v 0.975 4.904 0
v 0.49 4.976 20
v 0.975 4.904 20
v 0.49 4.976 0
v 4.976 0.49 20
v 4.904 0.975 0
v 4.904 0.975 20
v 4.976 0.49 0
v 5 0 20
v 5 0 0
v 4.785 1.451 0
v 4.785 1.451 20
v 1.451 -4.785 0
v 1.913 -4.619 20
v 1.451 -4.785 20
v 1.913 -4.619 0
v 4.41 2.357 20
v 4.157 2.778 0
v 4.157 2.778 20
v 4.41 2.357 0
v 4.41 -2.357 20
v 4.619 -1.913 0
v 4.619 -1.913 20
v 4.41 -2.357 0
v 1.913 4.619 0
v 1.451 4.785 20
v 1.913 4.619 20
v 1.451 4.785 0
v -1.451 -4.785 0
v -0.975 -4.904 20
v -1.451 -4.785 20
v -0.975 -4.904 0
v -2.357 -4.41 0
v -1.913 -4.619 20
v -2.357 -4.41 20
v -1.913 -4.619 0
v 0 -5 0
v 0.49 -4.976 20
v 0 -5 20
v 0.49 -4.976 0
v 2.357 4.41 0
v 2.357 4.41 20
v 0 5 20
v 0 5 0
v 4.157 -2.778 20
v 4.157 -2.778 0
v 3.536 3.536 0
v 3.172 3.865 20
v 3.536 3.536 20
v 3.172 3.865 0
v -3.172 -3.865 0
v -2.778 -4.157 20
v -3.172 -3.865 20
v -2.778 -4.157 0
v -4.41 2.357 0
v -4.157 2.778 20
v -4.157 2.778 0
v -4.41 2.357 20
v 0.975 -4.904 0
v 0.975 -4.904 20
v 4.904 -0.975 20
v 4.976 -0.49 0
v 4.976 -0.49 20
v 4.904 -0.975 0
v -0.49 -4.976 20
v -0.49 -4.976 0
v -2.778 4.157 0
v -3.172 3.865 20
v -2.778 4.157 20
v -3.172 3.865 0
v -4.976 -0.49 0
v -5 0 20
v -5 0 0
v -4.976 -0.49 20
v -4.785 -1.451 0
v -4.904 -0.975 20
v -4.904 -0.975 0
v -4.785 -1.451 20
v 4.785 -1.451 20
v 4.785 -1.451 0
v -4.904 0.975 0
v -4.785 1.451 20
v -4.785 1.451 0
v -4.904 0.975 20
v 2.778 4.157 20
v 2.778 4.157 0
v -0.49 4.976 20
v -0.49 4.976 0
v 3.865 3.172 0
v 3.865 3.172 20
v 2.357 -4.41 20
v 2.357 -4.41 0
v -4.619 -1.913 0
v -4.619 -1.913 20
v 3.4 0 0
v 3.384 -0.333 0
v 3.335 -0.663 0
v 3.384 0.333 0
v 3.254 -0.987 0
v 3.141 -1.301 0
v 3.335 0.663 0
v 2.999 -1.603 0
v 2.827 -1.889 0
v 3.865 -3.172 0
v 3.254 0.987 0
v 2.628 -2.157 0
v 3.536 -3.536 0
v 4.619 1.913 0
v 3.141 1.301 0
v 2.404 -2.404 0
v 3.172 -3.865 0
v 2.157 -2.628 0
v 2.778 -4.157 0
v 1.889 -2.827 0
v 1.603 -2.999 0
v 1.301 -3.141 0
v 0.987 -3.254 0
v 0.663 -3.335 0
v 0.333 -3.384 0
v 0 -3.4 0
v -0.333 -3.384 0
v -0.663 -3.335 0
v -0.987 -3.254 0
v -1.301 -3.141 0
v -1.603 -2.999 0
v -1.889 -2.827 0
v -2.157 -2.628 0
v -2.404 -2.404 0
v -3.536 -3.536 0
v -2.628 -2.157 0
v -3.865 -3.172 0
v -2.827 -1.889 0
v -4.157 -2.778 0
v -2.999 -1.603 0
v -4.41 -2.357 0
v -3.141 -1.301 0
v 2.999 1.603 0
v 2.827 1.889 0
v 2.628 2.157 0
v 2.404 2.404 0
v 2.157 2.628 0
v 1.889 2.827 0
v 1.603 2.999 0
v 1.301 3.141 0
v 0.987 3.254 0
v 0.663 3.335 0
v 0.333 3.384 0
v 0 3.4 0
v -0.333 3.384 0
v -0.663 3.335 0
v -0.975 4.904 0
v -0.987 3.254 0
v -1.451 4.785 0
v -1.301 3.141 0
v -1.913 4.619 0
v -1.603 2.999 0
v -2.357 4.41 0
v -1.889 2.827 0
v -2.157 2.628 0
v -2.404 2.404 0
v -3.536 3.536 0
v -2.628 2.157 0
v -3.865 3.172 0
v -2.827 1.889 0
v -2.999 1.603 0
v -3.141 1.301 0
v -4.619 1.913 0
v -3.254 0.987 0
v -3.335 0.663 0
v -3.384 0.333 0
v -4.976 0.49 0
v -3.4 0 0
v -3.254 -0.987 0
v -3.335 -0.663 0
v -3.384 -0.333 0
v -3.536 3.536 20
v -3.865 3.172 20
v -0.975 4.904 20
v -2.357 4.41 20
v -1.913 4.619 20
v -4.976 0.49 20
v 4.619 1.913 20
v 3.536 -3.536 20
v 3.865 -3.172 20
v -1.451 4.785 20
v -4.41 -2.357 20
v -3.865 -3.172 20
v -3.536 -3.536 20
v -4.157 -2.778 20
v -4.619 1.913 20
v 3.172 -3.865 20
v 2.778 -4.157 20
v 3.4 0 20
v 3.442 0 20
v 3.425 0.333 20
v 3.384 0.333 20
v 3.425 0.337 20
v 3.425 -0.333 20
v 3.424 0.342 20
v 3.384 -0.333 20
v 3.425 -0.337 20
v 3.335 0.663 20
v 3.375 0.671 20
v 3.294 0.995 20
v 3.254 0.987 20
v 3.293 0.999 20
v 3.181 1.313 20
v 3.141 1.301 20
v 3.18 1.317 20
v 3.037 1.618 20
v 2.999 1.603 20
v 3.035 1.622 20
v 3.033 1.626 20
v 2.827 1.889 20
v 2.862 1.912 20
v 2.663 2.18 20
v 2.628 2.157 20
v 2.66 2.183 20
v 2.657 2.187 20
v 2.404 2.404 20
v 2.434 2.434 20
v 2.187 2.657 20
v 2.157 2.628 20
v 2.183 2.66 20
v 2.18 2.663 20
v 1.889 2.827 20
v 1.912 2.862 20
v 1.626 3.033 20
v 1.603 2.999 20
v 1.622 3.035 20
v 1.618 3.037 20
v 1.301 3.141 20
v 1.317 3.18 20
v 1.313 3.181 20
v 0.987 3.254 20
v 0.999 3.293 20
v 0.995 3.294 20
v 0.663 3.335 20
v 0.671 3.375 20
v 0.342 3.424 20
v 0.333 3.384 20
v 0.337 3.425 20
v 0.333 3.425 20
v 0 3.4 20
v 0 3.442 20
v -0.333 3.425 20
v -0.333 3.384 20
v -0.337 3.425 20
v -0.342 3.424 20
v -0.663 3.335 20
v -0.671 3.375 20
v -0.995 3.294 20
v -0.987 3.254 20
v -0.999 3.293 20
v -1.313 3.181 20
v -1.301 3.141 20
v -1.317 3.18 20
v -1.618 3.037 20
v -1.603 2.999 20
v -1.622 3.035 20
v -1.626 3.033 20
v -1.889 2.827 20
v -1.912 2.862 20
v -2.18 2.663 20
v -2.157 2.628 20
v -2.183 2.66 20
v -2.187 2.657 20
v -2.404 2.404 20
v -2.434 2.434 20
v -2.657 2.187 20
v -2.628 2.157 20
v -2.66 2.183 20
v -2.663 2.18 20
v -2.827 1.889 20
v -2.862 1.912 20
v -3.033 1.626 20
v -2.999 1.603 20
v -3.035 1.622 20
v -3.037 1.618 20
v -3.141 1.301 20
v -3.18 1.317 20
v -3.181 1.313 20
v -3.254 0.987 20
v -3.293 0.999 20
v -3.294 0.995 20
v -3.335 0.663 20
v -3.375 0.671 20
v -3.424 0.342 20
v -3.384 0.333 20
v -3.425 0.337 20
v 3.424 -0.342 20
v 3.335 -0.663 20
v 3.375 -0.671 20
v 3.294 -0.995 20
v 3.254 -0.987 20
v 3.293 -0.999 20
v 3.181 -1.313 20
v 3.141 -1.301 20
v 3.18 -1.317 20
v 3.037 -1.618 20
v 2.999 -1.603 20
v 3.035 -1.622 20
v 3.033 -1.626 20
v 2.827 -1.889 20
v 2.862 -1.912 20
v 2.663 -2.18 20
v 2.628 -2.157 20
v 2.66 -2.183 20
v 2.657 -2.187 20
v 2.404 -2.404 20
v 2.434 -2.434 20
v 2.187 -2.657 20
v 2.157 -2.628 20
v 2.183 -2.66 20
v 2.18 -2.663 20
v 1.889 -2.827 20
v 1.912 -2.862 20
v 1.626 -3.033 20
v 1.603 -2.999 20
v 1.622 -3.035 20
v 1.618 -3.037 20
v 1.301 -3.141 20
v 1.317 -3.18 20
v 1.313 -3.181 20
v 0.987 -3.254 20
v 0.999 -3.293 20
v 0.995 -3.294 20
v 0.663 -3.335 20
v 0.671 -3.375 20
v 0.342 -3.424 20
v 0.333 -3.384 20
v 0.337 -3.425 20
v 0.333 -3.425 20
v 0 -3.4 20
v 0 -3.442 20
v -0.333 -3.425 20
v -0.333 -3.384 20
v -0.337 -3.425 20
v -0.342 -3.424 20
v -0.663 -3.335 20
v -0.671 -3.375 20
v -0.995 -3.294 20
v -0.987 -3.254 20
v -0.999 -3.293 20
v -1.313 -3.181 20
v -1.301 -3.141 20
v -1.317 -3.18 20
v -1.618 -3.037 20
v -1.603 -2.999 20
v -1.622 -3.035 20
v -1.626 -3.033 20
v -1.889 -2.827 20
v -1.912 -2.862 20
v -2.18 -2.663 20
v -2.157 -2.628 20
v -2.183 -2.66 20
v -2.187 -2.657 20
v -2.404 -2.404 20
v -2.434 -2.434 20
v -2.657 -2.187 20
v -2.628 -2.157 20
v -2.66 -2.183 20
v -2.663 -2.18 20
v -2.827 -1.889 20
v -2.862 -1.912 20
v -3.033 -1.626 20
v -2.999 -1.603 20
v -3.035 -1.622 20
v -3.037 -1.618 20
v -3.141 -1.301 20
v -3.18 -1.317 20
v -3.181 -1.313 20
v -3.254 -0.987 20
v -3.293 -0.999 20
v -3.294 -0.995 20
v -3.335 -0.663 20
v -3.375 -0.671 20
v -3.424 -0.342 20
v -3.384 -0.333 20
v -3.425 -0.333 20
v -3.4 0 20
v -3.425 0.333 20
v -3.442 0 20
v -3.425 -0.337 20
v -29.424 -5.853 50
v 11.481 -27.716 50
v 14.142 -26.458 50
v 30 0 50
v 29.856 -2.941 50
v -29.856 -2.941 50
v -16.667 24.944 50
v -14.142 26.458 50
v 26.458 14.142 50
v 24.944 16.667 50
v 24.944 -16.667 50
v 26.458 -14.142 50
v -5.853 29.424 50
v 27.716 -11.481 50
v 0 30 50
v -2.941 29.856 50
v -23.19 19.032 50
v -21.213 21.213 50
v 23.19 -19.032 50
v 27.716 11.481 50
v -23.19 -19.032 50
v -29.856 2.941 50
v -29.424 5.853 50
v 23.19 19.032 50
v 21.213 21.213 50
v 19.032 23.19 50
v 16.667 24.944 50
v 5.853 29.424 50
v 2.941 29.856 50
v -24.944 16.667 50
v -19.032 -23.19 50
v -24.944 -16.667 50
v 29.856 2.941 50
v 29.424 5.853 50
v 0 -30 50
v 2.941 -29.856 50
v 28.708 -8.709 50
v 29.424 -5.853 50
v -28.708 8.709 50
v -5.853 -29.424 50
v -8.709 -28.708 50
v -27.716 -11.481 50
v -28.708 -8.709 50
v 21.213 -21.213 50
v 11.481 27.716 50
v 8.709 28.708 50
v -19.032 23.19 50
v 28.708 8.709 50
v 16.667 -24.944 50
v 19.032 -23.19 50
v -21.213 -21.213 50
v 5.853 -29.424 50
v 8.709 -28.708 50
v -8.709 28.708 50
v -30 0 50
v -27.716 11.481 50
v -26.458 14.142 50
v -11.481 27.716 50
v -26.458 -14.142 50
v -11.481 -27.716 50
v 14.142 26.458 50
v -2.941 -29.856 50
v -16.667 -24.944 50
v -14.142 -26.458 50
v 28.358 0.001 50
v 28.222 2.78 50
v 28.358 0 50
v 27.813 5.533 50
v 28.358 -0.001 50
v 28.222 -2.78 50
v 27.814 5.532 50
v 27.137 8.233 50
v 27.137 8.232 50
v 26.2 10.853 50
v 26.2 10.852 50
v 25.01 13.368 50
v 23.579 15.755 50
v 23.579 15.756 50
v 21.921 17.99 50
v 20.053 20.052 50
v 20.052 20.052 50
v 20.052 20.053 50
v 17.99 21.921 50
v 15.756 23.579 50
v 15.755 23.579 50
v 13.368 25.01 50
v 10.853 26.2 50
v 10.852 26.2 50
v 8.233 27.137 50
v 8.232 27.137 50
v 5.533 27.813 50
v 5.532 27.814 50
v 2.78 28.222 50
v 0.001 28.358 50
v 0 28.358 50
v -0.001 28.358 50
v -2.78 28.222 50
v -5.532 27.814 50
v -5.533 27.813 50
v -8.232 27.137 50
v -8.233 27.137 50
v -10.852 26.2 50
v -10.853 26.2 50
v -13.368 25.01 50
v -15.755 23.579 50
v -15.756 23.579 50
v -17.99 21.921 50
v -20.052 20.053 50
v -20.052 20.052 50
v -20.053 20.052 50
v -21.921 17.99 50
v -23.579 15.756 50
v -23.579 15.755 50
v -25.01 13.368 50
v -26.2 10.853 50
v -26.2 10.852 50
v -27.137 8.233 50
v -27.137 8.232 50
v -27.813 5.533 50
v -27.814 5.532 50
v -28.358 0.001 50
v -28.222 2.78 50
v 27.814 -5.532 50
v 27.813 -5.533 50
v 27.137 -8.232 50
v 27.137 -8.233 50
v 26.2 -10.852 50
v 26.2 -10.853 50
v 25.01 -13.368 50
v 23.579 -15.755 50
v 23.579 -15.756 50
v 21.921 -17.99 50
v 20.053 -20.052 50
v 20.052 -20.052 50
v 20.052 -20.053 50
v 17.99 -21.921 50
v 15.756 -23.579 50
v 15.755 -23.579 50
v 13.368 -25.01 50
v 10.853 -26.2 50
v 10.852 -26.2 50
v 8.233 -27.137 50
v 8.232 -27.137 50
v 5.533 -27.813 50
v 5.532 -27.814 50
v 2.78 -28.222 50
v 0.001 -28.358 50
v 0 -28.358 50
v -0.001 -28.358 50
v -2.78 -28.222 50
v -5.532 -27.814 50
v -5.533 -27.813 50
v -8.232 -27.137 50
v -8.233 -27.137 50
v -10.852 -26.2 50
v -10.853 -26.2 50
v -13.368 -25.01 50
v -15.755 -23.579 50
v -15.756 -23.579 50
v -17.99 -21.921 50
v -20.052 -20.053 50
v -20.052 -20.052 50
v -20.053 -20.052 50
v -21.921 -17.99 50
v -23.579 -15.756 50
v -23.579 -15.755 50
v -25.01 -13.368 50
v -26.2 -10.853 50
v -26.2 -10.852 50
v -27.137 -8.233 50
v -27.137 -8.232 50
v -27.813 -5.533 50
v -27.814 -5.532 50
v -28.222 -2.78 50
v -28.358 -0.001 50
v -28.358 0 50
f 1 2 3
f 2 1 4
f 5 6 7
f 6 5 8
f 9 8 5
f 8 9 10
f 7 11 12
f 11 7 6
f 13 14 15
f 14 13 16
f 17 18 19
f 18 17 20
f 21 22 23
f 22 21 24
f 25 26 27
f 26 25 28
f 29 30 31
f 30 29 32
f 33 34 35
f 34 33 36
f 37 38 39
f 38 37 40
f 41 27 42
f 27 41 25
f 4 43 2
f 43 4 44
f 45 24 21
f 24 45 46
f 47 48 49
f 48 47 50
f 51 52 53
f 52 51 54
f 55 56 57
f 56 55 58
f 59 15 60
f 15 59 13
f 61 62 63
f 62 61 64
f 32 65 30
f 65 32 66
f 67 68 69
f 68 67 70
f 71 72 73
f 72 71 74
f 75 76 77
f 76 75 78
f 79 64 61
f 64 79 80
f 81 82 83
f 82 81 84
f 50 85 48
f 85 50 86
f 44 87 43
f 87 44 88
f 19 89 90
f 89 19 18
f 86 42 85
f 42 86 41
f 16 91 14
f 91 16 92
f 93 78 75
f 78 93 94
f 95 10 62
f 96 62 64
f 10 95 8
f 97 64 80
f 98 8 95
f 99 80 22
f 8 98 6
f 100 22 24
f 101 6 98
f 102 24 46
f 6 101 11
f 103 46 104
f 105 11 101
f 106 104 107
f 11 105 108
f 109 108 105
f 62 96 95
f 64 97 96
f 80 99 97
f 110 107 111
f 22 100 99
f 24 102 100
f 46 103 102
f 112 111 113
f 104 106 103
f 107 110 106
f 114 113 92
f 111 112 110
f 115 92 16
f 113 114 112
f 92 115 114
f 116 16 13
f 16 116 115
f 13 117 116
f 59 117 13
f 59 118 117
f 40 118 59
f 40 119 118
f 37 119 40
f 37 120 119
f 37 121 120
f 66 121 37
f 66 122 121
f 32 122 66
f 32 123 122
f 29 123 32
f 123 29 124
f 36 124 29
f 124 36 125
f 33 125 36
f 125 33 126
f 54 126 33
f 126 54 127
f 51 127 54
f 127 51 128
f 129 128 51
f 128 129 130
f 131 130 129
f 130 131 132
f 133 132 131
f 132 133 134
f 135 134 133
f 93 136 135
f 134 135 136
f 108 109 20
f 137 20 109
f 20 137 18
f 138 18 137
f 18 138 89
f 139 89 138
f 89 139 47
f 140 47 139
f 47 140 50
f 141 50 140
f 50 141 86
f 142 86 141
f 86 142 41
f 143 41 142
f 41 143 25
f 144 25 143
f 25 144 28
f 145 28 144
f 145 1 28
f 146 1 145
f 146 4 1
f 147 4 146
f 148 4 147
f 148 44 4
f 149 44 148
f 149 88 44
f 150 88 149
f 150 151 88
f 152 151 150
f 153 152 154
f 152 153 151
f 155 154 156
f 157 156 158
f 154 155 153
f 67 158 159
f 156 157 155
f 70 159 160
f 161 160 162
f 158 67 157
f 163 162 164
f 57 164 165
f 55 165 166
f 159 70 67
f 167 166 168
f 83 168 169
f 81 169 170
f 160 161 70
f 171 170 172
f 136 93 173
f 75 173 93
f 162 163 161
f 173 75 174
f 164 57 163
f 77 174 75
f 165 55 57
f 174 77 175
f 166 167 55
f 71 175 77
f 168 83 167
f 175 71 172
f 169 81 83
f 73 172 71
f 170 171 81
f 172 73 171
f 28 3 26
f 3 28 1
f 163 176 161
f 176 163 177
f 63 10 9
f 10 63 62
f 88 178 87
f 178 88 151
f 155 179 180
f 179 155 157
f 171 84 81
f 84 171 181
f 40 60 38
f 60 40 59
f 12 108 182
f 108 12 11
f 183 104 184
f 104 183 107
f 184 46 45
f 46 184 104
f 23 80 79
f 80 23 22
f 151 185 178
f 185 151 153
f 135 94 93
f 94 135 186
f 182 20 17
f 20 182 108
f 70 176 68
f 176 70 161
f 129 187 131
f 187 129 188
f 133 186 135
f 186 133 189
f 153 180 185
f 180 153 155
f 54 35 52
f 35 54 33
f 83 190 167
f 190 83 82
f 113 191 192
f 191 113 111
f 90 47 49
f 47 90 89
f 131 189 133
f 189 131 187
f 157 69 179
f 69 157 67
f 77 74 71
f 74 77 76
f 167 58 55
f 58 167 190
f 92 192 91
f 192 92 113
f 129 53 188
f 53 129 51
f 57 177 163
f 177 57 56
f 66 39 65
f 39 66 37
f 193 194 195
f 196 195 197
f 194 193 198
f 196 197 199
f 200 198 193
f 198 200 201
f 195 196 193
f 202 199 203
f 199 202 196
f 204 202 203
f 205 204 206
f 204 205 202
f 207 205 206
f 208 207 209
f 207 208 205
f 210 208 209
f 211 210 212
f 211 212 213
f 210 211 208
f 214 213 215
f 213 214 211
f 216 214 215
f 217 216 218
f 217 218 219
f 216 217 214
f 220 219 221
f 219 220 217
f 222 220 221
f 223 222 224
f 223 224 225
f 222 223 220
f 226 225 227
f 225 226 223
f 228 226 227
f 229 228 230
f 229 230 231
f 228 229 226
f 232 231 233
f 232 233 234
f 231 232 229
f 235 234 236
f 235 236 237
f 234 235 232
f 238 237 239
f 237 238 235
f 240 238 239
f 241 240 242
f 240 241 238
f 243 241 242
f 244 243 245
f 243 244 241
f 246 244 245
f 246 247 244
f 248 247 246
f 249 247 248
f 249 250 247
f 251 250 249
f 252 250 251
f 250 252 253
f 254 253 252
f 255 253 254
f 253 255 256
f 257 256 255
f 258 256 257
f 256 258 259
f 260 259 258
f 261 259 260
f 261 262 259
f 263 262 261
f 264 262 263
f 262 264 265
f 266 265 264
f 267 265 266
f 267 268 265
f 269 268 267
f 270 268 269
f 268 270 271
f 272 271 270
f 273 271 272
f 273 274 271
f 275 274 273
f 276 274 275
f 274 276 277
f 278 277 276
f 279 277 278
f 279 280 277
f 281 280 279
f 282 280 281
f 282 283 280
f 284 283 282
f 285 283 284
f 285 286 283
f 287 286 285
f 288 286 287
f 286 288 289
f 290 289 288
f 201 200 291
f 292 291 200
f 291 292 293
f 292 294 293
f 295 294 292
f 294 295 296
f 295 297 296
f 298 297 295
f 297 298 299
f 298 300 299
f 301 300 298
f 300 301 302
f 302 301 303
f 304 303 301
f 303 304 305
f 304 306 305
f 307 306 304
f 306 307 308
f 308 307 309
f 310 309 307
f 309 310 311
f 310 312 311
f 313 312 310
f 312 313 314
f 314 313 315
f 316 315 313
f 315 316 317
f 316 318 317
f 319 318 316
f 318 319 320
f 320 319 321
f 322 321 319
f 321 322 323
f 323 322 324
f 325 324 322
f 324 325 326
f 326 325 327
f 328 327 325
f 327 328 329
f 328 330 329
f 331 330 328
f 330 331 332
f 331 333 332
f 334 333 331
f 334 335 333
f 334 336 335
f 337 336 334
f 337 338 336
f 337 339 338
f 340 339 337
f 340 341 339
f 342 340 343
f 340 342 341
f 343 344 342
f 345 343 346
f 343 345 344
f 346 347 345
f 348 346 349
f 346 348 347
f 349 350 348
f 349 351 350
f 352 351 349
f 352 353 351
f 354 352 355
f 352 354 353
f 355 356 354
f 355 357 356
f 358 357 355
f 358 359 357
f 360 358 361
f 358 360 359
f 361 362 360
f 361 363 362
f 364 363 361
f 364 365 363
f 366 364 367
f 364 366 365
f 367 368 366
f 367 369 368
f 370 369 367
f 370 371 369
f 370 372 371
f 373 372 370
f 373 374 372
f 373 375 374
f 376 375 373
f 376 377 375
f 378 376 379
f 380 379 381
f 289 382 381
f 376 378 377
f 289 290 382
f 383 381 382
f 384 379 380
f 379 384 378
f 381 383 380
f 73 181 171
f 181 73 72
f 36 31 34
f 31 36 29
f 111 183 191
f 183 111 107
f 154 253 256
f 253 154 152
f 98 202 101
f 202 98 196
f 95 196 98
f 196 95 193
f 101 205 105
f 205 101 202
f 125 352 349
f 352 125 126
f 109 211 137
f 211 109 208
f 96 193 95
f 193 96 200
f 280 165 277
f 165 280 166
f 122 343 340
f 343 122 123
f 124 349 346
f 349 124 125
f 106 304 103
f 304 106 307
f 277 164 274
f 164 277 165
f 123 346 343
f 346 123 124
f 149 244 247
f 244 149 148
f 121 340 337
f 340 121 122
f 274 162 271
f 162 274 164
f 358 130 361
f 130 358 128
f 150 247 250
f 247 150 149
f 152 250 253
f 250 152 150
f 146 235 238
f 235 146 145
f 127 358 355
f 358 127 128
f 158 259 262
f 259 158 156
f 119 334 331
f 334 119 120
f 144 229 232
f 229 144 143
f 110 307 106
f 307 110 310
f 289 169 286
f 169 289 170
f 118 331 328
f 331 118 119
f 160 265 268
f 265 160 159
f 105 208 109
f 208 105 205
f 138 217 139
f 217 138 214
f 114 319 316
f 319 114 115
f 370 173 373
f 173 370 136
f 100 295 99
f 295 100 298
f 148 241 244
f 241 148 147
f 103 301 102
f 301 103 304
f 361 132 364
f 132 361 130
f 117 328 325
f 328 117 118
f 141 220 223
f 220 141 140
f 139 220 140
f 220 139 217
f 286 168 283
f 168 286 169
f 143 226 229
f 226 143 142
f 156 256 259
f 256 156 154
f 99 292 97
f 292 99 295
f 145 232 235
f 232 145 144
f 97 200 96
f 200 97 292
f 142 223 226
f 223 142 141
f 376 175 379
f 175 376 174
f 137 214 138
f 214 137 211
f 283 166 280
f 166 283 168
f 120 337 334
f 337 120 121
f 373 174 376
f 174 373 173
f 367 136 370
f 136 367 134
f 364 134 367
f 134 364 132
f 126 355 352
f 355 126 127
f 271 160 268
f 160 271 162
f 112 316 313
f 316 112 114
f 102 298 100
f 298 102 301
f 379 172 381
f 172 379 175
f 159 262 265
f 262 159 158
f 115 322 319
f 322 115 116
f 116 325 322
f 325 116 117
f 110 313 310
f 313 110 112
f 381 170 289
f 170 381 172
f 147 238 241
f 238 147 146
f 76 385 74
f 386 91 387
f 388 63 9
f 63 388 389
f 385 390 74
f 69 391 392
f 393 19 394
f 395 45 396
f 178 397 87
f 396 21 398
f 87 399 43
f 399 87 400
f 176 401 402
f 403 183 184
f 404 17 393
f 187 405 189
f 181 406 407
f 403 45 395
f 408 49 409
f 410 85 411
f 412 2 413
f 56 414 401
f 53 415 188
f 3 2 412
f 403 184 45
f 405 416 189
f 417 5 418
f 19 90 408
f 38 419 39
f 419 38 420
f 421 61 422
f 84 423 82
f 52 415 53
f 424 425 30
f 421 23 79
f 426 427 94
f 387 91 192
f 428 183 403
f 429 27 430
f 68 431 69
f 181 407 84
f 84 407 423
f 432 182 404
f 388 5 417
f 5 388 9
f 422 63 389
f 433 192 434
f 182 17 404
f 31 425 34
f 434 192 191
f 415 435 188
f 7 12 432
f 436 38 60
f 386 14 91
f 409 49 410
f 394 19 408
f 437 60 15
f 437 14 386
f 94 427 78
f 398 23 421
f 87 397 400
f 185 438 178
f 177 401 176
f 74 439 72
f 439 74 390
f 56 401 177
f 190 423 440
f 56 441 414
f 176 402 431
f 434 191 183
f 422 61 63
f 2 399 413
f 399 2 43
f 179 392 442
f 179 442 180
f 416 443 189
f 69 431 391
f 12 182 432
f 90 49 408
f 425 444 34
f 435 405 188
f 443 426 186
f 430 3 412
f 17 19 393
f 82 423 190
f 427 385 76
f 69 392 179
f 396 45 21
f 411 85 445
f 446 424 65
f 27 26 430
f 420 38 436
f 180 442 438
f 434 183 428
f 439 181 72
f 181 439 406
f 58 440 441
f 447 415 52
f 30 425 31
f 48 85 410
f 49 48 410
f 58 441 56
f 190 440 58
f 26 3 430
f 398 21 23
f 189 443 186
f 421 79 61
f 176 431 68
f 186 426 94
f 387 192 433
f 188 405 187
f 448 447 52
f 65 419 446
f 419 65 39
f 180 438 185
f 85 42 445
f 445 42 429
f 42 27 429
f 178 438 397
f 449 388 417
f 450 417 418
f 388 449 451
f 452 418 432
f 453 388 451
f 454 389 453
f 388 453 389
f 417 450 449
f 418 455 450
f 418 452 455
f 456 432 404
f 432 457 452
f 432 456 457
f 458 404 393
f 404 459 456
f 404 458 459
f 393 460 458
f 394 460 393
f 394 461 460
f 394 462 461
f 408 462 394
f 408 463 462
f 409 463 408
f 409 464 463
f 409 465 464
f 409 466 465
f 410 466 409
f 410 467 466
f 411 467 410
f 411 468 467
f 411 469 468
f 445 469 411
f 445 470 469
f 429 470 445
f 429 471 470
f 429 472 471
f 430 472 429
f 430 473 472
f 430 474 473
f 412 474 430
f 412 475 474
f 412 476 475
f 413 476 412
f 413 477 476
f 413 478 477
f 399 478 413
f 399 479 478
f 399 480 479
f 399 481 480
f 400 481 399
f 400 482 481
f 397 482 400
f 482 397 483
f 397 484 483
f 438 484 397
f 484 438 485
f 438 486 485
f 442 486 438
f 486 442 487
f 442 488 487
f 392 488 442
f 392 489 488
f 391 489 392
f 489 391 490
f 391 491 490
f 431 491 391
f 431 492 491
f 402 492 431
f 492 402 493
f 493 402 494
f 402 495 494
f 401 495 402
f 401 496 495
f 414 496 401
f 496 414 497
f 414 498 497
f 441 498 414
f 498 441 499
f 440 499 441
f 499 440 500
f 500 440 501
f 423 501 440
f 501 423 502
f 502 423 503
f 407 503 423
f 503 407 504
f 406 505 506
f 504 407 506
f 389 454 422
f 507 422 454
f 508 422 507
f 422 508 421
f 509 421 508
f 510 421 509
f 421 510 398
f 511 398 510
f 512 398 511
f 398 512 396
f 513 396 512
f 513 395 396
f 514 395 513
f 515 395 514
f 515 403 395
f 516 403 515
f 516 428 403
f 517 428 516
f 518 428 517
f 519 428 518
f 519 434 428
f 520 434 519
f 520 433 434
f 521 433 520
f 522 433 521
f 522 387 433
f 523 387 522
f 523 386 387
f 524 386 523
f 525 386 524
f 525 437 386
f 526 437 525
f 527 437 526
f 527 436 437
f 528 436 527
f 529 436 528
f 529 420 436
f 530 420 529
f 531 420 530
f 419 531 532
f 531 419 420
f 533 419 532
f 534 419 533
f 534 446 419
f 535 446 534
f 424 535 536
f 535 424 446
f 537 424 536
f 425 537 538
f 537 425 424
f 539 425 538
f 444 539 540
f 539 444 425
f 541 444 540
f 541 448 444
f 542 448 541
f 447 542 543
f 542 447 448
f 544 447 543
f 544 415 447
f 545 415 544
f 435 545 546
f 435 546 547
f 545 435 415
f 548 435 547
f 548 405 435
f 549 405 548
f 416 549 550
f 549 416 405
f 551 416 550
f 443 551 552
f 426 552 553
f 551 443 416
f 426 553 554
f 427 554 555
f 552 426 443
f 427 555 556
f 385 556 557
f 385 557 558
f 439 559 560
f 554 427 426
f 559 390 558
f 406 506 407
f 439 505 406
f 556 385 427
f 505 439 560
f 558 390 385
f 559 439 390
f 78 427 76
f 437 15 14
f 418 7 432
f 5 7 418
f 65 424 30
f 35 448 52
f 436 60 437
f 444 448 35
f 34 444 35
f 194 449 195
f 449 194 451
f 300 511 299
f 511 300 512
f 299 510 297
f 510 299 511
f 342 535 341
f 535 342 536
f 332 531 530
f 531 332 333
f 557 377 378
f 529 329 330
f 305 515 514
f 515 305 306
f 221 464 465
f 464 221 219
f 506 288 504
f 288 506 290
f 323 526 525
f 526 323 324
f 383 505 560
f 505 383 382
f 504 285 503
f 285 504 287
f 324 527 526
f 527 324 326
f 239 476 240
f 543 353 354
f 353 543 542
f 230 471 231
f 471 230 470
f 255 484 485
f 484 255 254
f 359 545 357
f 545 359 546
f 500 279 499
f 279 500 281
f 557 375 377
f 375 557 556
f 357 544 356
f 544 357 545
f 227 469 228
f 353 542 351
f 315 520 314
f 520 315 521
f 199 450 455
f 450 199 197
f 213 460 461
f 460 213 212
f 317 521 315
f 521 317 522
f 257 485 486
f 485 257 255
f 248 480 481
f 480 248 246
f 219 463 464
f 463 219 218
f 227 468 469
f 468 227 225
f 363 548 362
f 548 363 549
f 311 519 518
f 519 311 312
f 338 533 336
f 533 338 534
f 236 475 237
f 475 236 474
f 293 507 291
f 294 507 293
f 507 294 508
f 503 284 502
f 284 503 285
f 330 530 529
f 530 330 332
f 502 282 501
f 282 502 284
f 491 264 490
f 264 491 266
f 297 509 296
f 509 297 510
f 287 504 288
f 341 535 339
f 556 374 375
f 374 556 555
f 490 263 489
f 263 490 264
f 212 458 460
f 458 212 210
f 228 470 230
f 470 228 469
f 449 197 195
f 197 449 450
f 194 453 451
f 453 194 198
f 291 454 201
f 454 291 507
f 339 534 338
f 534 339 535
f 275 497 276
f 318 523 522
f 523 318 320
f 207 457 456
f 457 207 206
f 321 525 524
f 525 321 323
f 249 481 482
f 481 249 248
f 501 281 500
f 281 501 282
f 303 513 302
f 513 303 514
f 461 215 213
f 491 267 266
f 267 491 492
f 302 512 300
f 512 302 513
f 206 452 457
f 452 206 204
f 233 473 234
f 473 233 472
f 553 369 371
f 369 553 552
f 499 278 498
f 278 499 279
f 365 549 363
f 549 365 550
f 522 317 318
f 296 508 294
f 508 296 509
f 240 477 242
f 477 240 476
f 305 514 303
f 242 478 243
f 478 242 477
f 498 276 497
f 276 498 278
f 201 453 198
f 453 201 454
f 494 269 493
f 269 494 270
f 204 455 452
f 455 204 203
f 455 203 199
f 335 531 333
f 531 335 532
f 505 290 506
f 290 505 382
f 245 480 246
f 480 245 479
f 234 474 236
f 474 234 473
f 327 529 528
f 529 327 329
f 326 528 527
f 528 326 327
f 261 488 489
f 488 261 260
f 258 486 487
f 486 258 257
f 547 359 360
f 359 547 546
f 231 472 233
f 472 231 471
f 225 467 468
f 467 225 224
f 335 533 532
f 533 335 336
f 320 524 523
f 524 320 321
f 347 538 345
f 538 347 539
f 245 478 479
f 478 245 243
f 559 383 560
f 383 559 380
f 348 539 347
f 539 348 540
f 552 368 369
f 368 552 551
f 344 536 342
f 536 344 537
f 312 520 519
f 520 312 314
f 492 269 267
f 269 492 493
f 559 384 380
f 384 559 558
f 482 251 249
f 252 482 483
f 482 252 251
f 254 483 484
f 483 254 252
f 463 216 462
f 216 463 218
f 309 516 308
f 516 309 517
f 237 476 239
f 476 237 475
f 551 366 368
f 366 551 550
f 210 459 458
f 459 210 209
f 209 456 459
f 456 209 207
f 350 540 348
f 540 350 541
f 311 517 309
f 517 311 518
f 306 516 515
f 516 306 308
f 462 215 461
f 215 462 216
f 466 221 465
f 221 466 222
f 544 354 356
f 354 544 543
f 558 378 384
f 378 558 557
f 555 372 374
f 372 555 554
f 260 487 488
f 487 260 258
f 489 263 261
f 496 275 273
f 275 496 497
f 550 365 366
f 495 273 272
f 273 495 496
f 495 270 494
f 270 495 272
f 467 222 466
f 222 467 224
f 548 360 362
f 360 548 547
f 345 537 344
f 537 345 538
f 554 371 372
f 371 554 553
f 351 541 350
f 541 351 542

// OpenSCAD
// Lab Funnel - OpenSCAD Model
// Dimensions measured in mm

// Spout dimensions
spout_outer_dia = 10;
spout_inner_dia = 6.8;
spout_height = 20;

// Cone dimensions
cone_bottom_outer_dia = 10;
cone_top_outer_dia = 60;
cone_bottom_inner_dia = 6.8;
cone_top_inner_dia = cone_top_outer_dia - 2 * 1.6; // 56.8 mm
cone_height = 30; // z=20 to z=50

// Wall thickness
wall_thickness = 1.6;

// Print quality
$fn = 64;

// Center the funnel on the origin in X and Y
// The funnel rests on z=0 and builds upward

union() {
    // Spout (straight tube from z=0 to z=20)
    difference() {
        // Outer spout
        cylinder(h = spout_height, r = spout_outer_dia / 2, center = false);
        // Inner spout (bore) - extend slightly past to ensure clean cut
        translate([0, 0, -0.05])
        cylinder(h = spout_height + 0.1, r = spout_inner_dia / 2, center = false);
    }
    
    // Cone section (from z=20 to z=50)
    difference() {
        // Outer cone
        translate([0, 0, spout_height])
        cylinder(h = cone_height, r1 = cone_bottom_outer_dia / 2, r2 = cone_top_outer_dia / 2, center = false);
        
        // Inner cone (bore) - extend slightly past to ensure clean cut
        translate([0, 0, spout_height - 0.05])
        cylinder(h = cone_height + 0.1, r1 = cone_bottom_inner_dia / 2, r2 = cone_top_inner_dia / 2, center = false);
    }
}
